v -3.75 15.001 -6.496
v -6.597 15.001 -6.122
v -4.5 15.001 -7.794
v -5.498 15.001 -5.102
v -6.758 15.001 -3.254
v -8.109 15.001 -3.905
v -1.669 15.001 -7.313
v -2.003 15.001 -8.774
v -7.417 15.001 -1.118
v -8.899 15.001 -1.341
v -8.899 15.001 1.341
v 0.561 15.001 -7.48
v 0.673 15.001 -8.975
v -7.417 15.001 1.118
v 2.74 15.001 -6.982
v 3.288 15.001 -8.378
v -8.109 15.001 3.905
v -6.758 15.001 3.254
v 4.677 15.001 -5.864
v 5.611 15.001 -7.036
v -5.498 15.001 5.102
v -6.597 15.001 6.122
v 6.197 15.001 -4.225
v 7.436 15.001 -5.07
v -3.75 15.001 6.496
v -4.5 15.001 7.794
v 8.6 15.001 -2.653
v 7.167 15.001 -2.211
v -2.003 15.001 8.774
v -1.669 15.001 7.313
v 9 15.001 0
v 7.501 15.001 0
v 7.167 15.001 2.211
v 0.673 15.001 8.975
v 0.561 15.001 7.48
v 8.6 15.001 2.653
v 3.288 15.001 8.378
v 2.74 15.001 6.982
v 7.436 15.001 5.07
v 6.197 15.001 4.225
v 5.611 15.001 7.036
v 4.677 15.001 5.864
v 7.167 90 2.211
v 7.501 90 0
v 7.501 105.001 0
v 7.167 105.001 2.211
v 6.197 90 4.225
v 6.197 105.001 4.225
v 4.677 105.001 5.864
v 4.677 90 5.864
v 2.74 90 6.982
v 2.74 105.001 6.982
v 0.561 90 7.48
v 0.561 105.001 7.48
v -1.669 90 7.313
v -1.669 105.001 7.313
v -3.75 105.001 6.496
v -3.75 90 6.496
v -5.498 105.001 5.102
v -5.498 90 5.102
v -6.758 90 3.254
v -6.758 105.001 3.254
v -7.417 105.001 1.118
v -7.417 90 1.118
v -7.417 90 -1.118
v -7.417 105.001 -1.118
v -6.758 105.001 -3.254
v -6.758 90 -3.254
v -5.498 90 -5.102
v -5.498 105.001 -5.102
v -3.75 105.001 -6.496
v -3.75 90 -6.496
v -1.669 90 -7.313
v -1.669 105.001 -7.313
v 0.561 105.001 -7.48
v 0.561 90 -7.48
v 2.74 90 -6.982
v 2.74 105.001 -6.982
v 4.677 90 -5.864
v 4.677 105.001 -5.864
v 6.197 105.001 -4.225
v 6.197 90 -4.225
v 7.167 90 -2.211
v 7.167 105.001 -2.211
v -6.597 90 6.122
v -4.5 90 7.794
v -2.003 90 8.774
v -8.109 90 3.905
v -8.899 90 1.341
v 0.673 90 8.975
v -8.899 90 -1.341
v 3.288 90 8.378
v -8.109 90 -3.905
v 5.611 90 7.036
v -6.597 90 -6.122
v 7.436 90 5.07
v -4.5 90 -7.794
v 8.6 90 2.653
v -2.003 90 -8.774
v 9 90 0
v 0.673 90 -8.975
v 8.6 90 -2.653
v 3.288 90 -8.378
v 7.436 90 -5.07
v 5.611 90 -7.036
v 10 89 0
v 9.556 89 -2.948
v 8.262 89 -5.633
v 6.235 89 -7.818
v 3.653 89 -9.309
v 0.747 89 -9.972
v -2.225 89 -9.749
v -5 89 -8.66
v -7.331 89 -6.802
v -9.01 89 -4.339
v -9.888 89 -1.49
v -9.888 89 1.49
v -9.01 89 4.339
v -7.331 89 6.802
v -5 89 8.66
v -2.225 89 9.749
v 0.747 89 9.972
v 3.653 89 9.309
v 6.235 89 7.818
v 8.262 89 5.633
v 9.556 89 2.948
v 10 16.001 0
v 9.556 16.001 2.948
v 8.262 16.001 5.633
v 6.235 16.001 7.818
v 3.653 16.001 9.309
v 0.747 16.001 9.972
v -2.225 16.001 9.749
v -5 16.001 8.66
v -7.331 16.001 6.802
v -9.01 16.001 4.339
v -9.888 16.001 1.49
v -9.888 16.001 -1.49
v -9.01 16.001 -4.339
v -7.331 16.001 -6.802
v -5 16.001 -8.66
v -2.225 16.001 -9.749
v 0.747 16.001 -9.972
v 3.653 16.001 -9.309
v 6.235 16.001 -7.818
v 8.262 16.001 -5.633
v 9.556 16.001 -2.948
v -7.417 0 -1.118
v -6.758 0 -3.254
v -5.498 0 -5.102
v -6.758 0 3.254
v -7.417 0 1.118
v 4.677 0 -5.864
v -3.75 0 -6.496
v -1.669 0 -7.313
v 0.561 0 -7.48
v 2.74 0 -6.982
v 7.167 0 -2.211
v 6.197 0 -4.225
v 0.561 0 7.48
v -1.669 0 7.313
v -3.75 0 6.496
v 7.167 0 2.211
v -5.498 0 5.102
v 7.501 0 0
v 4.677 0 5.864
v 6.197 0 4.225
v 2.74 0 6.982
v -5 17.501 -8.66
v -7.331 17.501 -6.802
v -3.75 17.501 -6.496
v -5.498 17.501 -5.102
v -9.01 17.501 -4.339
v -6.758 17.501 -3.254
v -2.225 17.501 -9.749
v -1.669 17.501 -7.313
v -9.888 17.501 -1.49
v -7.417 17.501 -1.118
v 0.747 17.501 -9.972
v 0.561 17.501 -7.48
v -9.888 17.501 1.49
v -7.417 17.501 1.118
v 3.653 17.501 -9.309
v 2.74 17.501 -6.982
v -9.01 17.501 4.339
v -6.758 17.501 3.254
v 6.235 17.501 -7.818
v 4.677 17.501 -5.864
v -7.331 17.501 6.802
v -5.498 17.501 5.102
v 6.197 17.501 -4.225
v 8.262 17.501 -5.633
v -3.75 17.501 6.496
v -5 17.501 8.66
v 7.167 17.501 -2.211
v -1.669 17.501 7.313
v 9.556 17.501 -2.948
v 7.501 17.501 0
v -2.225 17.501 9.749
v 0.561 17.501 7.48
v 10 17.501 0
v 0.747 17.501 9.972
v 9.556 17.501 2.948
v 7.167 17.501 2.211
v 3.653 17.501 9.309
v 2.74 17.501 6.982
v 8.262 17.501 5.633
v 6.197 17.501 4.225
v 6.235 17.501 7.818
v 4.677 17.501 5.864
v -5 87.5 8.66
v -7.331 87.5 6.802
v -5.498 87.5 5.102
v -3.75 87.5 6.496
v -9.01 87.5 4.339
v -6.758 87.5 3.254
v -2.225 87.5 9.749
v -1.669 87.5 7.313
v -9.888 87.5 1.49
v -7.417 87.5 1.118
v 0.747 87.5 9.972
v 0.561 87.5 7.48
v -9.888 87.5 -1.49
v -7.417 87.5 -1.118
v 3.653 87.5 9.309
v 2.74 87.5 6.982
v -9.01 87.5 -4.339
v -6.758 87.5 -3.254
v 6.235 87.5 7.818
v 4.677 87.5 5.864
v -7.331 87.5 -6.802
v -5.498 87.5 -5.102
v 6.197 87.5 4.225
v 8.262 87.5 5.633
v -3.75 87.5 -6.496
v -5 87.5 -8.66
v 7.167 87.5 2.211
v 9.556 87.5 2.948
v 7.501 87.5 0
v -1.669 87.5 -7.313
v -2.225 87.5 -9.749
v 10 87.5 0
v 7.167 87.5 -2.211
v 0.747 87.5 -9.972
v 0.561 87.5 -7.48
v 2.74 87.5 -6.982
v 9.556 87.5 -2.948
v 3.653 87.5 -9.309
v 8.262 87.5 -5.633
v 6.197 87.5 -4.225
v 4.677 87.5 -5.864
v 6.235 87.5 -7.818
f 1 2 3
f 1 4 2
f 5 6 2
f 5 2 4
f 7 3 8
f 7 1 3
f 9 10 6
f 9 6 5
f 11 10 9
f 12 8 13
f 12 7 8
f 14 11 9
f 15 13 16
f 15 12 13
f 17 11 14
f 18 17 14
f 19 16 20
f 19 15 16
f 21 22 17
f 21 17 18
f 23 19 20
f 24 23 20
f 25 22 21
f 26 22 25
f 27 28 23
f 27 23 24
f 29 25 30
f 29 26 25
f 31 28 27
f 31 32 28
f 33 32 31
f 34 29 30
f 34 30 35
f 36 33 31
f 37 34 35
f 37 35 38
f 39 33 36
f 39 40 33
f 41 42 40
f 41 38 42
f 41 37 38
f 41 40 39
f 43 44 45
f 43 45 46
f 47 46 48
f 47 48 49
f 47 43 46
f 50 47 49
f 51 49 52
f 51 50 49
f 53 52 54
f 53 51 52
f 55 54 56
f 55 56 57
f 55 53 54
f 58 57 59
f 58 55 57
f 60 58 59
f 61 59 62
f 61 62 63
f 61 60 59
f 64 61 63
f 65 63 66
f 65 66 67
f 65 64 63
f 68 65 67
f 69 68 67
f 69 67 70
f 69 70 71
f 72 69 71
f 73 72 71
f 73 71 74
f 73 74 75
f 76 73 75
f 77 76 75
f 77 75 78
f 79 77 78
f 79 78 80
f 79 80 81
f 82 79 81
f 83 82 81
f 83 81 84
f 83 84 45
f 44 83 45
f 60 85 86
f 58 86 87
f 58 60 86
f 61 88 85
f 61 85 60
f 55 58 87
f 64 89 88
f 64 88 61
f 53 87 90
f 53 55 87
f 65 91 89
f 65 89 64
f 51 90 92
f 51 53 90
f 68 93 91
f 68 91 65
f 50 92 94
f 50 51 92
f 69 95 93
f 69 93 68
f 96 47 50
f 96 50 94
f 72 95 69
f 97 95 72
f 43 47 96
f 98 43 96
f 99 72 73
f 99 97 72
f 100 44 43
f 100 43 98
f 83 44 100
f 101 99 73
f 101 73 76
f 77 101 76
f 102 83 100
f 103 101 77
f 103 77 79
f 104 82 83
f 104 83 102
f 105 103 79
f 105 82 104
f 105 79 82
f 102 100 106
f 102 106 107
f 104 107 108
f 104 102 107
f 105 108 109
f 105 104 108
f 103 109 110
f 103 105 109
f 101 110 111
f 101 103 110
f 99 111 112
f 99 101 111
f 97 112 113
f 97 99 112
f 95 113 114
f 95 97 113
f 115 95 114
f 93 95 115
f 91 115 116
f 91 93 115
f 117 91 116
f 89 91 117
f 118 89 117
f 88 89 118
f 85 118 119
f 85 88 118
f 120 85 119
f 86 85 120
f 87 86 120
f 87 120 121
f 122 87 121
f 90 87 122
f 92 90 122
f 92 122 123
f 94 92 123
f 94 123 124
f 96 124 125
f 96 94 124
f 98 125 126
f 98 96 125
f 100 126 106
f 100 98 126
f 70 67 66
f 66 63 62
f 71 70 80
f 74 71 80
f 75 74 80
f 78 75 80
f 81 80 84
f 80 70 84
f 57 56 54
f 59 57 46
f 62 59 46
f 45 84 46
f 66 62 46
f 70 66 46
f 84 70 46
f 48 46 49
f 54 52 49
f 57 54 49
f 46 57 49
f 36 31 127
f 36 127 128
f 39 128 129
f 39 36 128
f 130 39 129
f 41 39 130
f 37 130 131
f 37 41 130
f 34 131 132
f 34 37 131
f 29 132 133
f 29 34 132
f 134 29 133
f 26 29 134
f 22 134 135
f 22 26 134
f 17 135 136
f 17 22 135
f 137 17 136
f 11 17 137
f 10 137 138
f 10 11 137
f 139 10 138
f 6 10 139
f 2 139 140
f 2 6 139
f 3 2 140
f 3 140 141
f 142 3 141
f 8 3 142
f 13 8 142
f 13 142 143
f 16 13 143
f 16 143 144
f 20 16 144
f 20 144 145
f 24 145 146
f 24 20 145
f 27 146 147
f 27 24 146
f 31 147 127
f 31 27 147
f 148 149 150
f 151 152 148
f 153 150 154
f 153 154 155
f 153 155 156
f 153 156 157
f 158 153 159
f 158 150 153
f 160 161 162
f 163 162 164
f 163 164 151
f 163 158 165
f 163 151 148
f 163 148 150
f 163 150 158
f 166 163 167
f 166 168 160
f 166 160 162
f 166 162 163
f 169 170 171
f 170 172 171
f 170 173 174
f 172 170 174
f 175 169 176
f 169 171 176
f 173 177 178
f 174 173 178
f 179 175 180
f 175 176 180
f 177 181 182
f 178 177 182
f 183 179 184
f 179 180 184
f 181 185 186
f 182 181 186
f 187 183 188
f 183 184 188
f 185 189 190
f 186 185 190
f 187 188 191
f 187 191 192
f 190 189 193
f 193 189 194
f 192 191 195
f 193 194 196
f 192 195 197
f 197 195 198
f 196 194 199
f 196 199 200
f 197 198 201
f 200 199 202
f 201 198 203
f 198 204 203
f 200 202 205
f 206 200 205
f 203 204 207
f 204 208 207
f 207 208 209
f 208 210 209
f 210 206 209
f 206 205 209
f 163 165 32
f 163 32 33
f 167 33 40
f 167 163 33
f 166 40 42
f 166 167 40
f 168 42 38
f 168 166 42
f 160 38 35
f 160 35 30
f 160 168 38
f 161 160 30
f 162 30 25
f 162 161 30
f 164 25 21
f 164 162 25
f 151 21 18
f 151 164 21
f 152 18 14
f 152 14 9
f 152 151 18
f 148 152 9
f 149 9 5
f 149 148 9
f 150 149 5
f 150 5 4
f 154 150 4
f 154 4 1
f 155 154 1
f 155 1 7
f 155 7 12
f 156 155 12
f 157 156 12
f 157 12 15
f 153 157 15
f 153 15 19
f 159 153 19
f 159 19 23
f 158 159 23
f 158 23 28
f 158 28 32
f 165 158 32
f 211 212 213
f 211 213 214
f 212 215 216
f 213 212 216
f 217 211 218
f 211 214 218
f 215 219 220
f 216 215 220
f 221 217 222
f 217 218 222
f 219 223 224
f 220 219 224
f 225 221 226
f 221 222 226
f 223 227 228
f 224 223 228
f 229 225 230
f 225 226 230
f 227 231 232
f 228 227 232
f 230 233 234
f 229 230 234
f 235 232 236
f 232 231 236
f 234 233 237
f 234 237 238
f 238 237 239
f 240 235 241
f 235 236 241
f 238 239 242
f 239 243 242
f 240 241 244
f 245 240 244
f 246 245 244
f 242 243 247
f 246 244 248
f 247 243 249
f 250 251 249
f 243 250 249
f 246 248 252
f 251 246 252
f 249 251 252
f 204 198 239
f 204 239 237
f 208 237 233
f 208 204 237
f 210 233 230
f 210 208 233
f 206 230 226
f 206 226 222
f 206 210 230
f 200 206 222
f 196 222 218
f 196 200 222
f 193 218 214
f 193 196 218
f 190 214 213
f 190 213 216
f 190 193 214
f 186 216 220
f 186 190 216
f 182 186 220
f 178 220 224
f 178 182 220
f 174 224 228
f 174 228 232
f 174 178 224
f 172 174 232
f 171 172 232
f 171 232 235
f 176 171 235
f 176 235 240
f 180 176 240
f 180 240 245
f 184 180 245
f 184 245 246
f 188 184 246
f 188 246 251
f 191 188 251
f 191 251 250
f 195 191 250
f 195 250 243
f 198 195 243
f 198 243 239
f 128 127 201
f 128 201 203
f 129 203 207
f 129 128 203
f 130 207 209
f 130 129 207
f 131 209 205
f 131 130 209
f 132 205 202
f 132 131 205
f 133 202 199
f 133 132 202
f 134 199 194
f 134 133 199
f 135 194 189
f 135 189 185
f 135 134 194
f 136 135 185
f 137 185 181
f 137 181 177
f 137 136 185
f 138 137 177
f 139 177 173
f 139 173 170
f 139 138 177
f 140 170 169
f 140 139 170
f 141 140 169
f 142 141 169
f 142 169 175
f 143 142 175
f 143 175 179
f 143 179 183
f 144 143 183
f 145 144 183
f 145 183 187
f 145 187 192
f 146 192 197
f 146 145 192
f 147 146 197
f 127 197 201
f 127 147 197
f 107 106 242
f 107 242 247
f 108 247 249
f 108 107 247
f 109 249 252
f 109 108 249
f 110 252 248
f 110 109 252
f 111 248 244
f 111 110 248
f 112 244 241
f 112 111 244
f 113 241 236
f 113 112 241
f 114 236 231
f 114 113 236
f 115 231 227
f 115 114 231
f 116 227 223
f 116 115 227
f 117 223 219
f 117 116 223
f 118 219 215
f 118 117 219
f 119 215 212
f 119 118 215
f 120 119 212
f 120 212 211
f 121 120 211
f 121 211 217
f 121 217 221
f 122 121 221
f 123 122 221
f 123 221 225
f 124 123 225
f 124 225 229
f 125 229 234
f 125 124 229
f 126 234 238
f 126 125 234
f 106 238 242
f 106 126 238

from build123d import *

# Parameters (mm, degrees)
F0_R     = 7.50062
F1_DEPTH = 105.00106
F3_R     = 9.99998
F4_DEPTH = 2.49936
F6_R     = 9.99998
F7_DEPTH = 2.49936
F8_SIZE  = 0.999998


with BuildPart() as f1:
    # F0 (on Front) → F1 (new body)
    with BuildSketch(Plane.XZ):
        Circle(F0_R)
    extrude(amount=-F1_DEPTH)

    # F3 (on offset) → F4 (join)
    with BuildSketch(Plane.XZ.offset(-15.00124)):
        Circle(F3_R)
    extrude(amount=-F4_DEPTH)

    # F6 (on offset) → F7 (join)
    with BuildSketch(Plane(origin=(0, 89.99982, 0), x_dir=(1, 0, 0), z_dir=(0, 1, 0))):
        Circle(F6_R)
    extrude(amount=-F7_DEPTH)

    # F8
    f8_edges = [f1.edges().sort_by_distance(p)[0] for p in [
        (-9.99998, 15.00124, 0),
        (-9.99998, 89.99982, 0),
    ]]
    chamfer(f8_edges, length=F8_SIZE)


solid = f1.part
